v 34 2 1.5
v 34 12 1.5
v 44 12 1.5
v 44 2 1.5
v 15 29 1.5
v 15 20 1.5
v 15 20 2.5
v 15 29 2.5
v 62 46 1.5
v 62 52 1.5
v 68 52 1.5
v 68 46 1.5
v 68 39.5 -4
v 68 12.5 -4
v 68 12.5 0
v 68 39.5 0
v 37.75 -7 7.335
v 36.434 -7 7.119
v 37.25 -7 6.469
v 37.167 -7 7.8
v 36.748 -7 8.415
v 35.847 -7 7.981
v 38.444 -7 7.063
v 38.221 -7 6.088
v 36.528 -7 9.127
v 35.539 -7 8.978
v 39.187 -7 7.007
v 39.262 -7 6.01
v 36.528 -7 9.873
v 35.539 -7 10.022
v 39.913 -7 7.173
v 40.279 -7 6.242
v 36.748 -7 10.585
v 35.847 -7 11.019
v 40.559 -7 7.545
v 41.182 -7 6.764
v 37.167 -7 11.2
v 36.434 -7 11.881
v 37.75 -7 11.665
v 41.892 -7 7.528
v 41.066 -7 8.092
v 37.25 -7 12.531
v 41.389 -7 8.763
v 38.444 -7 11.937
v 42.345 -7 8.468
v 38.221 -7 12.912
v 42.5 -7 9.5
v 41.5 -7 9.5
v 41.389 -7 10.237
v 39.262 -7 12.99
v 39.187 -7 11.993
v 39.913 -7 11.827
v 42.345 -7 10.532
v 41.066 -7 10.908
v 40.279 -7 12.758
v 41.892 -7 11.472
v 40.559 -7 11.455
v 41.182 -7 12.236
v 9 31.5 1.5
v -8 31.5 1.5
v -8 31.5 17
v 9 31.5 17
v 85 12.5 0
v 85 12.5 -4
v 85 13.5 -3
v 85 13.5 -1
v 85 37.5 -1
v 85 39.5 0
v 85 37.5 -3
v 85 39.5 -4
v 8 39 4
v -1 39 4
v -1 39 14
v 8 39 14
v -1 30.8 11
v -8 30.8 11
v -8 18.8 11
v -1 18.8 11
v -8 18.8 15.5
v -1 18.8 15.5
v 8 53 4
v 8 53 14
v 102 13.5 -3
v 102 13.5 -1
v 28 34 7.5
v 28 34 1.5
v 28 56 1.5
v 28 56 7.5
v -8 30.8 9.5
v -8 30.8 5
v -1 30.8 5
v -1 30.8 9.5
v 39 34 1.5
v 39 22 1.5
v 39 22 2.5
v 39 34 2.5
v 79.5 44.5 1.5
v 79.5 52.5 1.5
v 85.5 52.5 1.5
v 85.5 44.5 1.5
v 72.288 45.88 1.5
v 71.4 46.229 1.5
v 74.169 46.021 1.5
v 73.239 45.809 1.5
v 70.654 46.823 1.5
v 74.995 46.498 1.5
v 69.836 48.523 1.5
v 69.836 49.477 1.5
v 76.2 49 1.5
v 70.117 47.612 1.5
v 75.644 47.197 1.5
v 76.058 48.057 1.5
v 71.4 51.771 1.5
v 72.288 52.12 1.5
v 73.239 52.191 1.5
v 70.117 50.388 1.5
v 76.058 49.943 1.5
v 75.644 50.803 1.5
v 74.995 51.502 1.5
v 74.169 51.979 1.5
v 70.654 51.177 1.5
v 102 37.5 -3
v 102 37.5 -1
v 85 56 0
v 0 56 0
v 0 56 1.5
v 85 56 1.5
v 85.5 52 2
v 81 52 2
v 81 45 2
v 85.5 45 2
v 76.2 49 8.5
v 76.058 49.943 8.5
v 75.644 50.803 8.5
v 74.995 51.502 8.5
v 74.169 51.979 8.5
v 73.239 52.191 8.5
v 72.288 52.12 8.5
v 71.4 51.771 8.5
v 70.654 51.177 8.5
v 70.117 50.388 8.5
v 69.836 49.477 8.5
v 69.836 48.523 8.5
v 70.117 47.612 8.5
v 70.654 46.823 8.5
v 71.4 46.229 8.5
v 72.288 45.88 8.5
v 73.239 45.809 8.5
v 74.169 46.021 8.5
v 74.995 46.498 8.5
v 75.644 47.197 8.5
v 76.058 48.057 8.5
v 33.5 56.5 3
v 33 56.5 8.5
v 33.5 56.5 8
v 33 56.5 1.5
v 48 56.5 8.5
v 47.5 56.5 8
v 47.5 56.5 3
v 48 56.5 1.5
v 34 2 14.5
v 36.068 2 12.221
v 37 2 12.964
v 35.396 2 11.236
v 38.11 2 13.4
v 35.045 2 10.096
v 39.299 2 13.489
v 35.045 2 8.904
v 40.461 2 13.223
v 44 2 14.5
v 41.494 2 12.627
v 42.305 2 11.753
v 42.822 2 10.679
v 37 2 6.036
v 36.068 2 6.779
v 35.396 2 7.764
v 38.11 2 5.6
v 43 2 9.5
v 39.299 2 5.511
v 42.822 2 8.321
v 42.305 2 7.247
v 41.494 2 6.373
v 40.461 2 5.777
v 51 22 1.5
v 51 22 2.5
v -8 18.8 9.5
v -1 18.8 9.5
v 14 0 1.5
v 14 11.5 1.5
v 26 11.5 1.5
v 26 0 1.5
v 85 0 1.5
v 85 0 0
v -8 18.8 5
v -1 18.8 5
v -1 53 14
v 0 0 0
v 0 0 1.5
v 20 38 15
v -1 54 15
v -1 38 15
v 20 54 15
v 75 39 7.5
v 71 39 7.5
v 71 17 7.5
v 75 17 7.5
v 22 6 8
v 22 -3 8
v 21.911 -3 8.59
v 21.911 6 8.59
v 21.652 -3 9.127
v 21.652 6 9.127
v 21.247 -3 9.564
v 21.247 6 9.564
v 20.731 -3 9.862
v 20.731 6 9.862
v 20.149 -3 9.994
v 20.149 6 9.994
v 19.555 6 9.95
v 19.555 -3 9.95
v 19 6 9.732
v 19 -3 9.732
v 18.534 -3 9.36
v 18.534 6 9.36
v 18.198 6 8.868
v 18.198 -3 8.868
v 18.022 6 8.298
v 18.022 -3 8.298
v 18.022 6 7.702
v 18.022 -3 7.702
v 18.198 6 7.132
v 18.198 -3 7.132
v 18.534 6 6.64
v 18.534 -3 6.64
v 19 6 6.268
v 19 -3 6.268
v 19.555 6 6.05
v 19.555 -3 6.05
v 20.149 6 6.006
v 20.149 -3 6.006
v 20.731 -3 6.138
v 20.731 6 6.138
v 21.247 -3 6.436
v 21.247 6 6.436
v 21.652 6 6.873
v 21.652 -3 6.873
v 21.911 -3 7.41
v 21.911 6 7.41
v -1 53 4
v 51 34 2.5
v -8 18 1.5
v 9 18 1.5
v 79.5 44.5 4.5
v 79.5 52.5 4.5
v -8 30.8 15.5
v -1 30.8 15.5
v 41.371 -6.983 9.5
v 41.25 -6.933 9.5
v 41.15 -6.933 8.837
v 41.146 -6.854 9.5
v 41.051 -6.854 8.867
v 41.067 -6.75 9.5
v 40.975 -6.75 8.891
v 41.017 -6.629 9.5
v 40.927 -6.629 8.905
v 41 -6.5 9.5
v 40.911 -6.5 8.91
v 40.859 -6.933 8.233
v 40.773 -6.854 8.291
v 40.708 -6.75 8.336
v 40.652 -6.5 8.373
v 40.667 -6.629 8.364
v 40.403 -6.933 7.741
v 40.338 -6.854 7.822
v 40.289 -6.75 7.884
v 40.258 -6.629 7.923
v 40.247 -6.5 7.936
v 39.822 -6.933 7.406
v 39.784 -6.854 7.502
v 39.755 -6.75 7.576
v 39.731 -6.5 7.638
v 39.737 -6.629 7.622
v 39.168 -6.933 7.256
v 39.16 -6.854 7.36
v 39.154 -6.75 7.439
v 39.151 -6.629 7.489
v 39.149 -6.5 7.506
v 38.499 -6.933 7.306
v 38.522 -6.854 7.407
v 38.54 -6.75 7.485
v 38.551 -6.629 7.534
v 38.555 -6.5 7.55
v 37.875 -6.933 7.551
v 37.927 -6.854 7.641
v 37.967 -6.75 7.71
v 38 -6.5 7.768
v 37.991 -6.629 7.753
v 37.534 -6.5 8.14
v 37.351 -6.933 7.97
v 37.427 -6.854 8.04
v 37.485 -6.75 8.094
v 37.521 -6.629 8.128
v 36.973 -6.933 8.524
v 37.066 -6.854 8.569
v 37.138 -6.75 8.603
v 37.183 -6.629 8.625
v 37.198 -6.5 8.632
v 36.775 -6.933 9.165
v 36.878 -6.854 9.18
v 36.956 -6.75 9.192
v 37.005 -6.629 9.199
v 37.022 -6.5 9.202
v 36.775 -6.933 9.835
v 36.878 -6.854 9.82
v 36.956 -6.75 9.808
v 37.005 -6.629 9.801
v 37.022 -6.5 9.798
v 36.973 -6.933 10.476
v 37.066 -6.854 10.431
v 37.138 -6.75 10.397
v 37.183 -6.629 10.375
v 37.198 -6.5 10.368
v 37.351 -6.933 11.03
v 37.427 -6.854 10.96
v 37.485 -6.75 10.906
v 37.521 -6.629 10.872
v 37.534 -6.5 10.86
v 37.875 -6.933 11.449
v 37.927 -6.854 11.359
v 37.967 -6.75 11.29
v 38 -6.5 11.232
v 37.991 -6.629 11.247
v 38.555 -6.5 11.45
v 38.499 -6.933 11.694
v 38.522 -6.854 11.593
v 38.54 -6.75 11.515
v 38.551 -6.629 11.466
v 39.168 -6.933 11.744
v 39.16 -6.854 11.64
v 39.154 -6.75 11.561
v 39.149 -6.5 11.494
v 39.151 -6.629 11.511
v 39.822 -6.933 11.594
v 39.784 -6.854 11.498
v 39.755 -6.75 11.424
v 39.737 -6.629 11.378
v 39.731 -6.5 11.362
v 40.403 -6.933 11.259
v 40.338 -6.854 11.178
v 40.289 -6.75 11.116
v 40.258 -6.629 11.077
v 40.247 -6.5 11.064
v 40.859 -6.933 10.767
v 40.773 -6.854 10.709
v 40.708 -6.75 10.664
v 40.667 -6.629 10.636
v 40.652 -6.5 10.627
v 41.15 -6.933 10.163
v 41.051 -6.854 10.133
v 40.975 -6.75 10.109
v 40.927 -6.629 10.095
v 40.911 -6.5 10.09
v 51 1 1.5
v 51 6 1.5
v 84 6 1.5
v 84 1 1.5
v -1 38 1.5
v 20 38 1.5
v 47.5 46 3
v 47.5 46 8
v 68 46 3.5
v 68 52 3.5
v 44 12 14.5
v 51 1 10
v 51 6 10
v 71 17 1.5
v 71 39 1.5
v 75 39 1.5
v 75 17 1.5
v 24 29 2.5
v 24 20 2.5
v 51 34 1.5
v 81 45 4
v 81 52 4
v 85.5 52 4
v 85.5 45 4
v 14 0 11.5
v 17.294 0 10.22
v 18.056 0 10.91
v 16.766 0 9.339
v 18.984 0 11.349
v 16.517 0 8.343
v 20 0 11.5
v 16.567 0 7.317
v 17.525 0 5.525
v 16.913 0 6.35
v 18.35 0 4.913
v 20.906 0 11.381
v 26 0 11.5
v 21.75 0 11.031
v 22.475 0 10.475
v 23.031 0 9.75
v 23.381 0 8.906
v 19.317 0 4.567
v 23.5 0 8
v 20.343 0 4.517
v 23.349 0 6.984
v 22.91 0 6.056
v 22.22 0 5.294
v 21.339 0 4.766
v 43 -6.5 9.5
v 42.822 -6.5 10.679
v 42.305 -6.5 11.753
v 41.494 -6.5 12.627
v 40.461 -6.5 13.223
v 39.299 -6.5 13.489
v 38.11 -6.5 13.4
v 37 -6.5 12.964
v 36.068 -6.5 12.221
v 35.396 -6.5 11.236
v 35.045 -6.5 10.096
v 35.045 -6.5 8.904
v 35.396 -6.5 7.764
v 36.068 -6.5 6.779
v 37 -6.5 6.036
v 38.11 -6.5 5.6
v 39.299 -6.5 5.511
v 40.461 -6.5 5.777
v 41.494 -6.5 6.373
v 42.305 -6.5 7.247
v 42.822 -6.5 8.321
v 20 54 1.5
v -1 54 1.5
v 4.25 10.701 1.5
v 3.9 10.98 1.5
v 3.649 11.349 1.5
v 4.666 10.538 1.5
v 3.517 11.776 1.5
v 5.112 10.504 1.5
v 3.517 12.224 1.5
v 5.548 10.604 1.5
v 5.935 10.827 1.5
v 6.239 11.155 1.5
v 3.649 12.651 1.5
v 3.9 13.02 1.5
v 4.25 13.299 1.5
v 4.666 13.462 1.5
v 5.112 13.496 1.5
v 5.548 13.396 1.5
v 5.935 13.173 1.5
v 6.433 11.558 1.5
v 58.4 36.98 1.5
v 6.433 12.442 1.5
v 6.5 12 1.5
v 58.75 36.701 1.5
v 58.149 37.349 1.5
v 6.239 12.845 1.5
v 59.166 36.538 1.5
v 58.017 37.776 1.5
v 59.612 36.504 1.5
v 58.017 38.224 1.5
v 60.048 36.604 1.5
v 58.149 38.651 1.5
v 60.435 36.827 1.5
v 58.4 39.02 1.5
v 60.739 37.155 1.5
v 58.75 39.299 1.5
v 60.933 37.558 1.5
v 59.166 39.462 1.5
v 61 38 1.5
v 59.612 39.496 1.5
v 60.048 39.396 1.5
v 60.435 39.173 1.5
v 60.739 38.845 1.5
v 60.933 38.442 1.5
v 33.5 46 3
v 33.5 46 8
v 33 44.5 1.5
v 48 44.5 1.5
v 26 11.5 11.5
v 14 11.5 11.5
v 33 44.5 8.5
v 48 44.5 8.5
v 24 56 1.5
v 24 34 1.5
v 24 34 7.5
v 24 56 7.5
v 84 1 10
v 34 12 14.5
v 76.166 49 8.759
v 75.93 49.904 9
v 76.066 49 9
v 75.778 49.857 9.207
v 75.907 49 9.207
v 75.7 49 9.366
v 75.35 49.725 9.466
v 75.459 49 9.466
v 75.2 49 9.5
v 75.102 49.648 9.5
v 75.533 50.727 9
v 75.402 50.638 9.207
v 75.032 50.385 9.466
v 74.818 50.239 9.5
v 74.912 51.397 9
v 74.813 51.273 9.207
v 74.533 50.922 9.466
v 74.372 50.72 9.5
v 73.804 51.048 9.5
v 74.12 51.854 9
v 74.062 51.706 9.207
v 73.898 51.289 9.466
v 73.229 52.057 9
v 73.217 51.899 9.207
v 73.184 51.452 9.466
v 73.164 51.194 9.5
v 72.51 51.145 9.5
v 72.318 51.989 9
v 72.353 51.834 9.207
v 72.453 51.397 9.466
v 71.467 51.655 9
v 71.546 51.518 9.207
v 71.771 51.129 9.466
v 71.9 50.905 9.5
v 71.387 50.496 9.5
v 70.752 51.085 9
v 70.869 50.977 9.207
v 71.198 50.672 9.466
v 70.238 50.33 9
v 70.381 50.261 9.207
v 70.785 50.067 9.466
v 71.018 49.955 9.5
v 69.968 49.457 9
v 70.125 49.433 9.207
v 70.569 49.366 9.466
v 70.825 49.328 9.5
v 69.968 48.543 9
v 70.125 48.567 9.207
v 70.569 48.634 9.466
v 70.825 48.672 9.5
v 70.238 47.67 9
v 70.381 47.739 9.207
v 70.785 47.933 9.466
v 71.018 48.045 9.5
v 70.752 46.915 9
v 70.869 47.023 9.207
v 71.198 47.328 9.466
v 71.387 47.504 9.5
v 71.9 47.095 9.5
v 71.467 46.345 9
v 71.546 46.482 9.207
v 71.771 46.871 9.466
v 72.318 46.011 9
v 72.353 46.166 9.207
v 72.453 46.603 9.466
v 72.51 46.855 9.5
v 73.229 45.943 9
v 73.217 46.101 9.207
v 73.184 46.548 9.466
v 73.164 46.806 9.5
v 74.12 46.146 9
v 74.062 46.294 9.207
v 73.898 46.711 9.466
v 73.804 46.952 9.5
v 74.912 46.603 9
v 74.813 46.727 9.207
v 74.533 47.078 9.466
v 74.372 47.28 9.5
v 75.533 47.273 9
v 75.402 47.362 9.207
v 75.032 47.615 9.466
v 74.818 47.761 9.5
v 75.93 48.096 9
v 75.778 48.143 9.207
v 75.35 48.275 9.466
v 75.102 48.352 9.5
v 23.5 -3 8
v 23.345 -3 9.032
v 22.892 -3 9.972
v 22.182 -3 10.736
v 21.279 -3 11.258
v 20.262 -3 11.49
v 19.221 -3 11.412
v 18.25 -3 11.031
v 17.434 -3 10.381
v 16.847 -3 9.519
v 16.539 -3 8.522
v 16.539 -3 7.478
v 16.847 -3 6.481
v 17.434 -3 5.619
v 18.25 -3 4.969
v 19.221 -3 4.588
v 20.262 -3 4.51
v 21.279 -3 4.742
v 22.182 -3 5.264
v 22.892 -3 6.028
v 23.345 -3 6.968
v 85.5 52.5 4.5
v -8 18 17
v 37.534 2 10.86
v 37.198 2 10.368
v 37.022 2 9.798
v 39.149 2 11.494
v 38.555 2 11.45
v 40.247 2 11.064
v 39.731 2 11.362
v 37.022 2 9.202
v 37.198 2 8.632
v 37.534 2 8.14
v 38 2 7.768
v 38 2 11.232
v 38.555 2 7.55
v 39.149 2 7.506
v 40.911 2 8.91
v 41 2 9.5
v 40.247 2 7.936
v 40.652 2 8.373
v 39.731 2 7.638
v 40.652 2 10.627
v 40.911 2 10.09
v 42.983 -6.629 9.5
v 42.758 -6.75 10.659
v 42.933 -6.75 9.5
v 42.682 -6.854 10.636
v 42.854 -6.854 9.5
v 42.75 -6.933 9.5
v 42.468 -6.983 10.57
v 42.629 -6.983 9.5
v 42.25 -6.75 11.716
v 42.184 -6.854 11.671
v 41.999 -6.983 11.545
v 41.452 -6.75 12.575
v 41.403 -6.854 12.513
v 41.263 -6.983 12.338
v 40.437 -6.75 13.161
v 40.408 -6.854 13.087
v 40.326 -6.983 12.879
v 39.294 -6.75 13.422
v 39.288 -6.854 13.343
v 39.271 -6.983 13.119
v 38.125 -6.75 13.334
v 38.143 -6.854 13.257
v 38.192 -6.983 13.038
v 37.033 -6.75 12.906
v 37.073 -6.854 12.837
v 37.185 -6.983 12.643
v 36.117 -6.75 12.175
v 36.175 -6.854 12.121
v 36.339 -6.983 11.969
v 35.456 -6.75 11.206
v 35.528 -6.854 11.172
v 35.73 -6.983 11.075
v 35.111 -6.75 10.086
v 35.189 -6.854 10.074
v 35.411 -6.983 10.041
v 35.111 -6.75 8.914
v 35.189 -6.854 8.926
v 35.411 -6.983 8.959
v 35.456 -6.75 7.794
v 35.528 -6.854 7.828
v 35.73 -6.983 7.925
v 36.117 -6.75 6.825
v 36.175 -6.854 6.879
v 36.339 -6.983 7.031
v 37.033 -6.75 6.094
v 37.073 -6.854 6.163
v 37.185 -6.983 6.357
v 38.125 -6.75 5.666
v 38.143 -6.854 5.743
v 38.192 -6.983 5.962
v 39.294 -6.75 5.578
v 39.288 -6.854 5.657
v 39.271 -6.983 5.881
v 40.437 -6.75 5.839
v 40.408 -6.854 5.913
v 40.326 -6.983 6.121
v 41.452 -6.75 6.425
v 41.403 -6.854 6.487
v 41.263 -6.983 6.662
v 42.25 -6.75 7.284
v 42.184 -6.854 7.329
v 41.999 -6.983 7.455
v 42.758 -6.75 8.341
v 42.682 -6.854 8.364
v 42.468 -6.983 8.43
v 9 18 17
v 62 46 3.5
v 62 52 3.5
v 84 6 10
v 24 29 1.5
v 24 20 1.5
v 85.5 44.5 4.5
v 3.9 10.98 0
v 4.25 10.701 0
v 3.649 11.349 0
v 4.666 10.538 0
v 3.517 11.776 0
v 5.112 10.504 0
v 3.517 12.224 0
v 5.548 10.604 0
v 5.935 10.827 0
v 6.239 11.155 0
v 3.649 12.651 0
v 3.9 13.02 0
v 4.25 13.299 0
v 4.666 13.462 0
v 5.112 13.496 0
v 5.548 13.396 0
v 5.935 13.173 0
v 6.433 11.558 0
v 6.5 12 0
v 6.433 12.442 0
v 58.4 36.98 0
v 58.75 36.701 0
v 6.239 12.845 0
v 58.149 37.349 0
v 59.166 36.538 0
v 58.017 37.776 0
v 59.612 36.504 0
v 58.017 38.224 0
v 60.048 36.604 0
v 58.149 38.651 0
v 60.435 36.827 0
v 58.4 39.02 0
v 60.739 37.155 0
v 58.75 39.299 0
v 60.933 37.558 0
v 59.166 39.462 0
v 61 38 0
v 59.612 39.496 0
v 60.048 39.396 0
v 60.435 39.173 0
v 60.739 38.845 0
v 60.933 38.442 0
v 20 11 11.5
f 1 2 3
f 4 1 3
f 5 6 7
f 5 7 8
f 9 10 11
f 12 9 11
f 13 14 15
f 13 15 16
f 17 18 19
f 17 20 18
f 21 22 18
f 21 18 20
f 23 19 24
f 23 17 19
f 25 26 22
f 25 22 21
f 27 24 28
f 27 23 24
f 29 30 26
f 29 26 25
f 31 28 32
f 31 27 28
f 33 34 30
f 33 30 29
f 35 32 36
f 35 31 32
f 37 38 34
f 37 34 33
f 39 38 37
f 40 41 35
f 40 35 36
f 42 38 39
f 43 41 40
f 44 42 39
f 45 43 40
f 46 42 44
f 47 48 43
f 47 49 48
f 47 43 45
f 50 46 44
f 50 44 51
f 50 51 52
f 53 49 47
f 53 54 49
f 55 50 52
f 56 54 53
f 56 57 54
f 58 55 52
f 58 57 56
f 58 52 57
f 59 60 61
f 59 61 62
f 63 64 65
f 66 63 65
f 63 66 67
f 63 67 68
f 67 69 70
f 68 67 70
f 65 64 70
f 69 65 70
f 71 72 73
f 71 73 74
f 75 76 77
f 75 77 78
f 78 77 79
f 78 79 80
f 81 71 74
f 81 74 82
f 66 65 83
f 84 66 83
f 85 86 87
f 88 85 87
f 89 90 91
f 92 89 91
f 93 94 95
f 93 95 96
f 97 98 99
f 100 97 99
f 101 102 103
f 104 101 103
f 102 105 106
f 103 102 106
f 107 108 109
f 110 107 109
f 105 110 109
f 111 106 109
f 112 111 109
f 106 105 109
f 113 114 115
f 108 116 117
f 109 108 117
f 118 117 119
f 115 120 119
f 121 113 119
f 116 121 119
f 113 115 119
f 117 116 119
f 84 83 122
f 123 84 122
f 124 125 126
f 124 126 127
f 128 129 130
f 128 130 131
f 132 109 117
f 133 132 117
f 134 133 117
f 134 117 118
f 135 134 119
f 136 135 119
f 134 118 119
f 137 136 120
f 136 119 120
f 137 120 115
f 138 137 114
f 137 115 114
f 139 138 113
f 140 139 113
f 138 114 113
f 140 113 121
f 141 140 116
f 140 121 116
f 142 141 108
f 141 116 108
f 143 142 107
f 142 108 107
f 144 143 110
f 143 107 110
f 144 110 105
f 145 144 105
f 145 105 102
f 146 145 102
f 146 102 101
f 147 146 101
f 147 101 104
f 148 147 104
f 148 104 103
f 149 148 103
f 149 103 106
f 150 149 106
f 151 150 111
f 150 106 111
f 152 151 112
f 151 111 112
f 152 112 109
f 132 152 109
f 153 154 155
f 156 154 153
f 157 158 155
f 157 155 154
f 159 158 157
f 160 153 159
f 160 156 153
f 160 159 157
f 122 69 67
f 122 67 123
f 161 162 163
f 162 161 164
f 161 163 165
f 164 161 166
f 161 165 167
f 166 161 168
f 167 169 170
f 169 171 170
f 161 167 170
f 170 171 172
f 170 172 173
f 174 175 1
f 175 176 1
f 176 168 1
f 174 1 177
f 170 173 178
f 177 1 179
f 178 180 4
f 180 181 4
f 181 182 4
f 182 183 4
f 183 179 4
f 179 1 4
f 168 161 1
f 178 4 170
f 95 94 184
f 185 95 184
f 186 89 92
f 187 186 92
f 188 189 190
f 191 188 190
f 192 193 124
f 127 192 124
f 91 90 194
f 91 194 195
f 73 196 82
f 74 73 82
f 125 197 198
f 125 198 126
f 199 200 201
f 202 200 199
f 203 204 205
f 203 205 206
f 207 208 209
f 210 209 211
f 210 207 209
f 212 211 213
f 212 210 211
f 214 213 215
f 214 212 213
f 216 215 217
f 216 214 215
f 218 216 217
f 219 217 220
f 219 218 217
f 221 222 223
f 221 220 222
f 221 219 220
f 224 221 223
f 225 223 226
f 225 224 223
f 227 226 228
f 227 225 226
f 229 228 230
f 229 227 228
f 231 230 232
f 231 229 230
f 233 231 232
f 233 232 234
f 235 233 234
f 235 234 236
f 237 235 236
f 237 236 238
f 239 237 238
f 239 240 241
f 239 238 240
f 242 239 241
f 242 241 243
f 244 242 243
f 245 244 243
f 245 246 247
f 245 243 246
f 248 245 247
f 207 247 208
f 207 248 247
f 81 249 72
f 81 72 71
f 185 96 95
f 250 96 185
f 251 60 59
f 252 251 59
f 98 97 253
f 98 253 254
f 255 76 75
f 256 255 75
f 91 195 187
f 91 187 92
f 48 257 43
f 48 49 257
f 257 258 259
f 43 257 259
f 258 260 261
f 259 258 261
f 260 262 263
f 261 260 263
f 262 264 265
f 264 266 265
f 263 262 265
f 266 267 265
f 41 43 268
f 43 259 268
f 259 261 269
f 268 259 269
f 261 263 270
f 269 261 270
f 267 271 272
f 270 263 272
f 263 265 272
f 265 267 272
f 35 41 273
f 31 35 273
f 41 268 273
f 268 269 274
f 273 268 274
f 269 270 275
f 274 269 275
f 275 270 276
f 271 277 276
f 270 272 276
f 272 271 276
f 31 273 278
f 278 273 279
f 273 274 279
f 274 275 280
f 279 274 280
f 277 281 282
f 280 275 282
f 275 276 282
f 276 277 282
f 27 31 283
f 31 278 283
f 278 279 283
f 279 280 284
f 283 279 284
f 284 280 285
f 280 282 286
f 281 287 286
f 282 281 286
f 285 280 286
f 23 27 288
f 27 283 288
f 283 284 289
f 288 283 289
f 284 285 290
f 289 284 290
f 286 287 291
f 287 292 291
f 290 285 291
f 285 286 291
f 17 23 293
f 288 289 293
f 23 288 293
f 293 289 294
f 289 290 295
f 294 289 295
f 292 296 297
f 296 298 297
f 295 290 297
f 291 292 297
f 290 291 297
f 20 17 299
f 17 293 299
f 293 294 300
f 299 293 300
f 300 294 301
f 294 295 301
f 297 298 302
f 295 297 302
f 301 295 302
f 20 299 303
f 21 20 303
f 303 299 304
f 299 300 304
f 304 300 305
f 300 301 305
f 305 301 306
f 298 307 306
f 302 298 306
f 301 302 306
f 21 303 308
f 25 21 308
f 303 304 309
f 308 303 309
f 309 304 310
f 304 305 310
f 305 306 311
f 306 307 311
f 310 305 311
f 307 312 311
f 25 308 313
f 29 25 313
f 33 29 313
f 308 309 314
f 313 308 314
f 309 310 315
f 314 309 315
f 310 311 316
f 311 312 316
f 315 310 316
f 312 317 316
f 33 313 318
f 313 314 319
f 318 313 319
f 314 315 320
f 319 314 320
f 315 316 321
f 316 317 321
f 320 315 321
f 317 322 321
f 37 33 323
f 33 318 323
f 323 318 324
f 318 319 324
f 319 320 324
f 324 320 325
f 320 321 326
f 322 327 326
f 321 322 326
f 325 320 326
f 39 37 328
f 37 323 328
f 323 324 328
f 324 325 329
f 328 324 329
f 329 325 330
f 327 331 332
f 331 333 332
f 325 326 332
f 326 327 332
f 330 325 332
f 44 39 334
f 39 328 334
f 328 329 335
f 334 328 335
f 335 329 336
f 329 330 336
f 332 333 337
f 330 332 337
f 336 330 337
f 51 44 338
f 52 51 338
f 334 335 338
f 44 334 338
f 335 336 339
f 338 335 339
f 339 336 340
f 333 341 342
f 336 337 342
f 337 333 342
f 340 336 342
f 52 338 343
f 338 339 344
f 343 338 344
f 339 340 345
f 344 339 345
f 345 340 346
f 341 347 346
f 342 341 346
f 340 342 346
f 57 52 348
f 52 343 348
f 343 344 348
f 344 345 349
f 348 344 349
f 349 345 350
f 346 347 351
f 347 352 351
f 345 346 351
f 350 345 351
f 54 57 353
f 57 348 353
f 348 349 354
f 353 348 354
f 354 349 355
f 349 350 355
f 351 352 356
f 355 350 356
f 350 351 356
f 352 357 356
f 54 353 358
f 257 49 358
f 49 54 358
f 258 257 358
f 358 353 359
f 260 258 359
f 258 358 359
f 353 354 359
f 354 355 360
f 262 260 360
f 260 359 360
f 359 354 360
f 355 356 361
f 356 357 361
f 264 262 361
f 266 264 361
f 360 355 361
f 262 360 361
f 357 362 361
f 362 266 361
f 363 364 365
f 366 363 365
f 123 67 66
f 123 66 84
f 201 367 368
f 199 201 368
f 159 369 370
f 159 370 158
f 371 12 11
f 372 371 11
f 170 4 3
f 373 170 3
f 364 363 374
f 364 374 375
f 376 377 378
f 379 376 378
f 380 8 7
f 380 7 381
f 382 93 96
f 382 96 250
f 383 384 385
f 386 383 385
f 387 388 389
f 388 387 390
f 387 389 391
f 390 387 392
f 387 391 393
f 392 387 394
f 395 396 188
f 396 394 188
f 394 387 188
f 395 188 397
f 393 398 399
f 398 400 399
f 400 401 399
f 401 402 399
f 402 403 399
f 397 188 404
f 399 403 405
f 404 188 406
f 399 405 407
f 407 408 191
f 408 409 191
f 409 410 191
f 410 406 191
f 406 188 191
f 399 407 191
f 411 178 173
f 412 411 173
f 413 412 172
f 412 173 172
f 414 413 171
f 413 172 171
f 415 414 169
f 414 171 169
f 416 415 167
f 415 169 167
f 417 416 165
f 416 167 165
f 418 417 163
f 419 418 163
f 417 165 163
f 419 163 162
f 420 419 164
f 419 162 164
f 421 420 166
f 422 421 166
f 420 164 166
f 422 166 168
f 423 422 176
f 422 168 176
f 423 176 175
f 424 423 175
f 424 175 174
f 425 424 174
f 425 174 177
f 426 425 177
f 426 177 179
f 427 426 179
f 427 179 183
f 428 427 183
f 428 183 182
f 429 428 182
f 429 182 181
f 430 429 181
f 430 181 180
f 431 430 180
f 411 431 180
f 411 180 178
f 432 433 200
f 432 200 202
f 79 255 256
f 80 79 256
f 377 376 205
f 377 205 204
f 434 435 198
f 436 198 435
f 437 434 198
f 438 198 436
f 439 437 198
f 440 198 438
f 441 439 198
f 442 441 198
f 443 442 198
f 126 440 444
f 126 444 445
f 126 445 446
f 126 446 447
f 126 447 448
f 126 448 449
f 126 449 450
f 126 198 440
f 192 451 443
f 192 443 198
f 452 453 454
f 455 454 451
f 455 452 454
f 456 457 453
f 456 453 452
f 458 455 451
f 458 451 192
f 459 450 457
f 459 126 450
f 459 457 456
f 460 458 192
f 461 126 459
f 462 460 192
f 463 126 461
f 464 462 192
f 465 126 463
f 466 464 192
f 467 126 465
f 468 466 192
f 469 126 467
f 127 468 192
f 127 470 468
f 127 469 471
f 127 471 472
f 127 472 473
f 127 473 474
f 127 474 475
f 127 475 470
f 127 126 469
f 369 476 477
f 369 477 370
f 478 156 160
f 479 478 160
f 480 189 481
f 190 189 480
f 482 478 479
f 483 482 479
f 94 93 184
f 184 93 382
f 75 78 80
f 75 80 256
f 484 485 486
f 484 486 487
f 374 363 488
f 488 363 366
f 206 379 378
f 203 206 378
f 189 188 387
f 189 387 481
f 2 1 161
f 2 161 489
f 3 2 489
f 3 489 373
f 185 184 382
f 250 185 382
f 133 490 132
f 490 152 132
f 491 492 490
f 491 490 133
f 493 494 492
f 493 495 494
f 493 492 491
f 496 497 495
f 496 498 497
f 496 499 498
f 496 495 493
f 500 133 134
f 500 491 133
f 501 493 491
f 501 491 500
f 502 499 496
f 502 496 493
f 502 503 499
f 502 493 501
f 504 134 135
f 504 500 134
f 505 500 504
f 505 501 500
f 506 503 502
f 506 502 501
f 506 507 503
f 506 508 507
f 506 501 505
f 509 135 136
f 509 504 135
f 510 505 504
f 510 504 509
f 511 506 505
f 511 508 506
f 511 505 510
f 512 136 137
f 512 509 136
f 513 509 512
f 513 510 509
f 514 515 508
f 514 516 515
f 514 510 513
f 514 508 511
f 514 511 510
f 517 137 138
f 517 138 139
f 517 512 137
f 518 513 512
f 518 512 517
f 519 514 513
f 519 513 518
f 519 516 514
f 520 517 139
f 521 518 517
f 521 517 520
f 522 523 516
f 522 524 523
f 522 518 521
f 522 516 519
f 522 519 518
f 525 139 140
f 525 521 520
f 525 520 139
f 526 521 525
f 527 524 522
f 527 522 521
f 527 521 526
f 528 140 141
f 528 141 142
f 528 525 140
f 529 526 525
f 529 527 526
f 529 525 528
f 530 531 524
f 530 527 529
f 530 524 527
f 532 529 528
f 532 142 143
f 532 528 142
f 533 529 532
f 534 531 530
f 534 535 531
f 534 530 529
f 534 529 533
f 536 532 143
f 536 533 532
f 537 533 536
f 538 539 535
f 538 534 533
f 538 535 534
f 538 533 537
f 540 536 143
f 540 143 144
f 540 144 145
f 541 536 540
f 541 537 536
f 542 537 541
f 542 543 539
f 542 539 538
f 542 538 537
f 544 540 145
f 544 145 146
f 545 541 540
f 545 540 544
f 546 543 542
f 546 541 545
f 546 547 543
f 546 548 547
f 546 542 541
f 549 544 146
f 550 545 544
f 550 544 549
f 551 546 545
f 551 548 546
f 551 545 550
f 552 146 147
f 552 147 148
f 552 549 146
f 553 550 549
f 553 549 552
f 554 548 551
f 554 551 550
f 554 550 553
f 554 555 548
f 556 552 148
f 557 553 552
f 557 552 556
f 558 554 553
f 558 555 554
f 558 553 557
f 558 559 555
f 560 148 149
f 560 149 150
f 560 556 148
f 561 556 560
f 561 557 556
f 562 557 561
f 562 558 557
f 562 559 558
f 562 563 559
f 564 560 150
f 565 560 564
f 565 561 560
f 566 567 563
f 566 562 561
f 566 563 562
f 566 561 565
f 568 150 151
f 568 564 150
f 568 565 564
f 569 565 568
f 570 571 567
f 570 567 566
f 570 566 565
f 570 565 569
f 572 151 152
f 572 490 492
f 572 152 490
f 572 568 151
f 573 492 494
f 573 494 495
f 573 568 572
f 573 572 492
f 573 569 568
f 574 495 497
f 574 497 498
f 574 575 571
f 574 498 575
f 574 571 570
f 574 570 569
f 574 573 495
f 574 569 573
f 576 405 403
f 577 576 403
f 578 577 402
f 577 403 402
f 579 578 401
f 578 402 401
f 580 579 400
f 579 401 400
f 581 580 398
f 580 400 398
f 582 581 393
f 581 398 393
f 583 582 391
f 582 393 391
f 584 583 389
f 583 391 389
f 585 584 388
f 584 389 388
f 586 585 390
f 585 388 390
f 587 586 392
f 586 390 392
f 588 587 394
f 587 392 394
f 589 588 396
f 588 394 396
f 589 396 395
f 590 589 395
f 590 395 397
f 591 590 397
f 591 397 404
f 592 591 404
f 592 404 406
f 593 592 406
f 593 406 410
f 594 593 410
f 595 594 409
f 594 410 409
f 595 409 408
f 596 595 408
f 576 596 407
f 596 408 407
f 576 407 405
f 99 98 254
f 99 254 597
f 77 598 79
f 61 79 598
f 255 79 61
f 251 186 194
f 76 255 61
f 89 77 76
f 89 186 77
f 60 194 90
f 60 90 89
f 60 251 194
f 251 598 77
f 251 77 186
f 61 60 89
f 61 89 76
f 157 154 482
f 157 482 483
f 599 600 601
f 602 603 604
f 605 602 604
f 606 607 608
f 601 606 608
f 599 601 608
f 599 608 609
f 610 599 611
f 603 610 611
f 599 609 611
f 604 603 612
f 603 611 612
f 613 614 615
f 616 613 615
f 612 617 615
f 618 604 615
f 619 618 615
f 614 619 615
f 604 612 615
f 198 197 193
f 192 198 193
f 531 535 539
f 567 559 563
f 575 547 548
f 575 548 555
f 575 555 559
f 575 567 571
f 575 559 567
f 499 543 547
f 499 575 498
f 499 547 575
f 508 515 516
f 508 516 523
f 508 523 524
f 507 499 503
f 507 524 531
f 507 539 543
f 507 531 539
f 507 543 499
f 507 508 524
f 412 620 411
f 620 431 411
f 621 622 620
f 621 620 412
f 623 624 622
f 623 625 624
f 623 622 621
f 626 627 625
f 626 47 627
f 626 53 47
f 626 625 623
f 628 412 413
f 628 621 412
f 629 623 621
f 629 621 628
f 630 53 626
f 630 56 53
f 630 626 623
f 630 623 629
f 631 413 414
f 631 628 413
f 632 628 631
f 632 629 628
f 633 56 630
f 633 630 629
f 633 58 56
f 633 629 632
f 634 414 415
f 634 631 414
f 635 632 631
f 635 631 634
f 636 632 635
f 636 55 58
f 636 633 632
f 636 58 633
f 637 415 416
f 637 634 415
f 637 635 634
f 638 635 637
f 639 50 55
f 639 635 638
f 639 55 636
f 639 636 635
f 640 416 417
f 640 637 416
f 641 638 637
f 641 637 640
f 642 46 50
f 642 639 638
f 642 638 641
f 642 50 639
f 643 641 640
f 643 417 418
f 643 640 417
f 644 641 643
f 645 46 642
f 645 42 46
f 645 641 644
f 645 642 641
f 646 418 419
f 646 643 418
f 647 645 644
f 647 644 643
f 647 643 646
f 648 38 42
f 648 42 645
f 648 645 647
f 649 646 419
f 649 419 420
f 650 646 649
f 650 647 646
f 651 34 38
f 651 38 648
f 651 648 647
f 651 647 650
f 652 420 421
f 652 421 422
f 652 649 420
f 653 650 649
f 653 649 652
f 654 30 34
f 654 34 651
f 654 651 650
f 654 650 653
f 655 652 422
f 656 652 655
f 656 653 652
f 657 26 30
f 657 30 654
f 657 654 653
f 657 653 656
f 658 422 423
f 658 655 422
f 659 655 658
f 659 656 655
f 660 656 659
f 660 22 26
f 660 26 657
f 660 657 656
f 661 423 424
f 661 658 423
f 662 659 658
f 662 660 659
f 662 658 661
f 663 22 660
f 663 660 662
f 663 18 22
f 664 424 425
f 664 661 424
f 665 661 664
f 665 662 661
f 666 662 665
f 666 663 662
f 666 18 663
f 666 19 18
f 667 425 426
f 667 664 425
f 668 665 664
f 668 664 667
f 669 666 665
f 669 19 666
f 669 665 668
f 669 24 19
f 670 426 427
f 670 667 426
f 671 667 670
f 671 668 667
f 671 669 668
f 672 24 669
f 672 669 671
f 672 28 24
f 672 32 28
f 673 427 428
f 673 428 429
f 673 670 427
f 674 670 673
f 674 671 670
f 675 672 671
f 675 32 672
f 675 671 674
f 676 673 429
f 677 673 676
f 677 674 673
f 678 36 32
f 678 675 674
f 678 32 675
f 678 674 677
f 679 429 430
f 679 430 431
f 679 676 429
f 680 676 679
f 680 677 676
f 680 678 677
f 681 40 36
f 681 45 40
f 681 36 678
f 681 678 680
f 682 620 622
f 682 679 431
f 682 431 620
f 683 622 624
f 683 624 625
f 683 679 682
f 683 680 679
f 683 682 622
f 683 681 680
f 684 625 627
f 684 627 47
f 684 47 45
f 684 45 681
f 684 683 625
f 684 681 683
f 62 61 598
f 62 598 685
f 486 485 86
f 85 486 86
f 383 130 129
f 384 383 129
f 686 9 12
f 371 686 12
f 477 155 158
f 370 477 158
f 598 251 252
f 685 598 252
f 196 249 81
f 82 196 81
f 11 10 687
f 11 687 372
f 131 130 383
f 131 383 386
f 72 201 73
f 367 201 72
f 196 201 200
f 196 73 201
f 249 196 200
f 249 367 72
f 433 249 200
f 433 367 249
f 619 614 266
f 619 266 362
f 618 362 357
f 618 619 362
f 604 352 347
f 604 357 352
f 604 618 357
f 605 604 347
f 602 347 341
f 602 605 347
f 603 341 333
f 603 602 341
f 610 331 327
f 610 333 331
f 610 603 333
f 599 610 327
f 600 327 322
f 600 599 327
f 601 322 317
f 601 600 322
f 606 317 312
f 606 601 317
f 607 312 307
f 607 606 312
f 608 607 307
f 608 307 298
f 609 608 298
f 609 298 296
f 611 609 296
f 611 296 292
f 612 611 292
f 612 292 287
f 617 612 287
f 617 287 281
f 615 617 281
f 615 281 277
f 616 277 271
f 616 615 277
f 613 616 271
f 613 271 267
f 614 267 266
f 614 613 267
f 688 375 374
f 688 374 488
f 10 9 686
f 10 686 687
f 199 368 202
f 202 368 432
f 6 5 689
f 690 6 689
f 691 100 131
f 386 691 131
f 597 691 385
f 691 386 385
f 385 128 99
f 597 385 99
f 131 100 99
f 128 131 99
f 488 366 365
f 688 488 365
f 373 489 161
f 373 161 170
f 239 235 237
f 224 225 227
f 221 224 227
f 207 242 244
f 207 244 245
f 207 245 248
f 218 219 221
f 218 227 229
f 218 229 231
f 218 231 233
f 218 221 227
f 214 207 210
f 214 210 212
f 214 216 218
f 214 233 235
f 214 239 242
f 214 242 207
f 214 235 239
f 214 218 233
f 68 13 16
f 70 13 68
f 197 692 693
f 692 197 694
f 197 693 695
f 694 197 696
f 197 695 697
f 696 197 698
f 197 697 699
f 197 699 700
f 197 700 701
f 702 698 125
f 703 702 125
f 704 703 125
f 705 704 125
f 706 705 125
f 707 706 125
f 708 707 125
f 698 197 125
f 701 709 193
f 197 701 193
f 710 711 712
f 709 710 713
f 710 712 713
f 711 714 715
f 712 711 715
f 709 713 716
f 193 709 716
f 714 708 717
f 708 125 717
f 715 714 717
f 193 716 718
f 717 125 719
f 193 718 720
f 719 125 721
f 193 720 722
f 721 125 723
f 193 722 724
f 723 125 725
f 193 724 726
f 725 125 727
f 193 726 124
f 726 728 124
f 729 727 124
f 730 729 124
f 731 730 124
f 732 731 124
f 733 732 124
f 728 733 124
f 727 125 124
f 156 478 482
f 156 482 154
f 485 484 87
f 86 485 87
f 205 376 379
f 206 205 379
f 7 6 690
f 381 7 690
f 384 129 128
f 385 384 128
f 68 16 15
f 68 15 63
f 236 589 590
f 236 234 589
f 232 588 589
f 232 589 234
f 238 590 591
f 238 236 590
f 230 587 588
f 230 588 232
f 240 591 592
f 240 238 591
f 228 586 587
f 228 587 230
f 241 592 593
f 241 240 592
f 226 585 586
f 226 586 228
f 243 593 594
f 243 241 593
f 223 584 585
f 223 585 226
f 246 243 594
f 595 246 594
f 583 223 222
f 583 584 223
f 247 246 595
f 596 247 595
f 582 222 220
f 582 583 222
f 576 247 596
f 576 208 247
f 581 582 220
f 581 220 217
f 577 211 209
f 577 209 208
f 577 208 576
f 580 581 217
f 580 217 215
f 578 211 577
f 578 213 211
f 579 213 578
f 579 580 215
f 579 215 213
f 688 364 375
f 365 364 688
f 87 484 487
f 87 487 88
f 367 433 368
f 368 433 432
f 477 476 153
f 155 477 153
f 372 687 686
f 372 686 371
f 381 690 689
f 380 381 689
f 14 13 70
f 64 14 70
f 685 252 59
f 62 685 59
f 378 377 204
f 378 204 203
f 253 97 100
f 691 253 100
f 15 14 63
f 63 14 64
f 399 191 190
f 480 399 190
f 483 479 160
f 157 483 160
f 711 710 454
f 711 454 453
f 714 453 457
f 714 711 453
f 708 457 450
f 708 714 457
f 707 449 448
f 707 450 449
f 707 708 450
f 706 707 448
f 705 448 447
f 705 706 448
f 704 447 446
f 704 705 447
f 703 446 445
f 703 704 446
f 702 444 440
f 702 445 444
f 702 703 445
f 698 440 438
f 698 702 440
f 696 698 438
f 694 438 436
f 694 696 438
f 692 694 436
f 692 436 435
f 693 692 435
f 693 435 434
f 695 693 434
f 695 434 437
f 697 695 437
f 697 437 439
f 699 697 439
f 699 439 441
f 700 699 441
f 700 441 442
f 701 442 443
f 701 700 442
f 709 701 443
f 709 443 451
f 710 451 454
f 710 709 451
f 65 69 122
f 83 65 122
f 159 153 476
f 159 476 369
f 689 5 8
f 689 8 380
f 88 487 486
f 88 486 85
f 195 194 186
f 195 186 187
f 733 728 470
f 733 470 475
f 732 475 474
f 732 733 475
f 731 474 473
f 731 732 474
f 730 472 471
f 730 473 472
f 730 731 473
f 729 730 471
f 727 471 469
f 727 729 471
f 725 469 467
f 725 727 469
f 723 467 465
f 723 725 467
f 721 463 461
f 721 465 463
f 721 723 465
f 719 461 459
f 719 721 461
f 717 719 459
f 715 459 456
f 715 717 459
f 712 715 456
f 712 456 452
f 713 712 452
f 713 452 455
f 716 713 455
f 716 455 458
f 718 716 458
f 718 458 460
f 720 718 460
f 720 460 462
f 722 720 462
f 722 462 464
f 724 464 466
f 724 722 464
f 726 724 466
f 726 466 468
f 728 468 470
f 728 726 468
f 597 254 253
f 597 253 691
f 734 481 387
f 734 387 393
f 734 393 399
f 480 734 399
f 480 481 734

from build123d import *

# Parameters (mm, degrees)
BOX001_W               = 33
BOX001_H               = 5
BOX001_DEPTH           = 8.5
CYLINDER001_R          = 2
CYLINDER001_DEPTH      = 10
CYLINDER001_ROLL_ANGLE = 90
BOX003_W               = 12
BOX003_H               = 11.5
BOX003_DEPTH           = 10
CYLINDER_R             = 3.5
CYLINDER_DEPTH         = 14
CYLINDER_ROLL_ANGLE    = 90
CYLINDER002_R          = 2
CYLINDER002_DEPTH      = 12
CYLINDER003_R          = 4
CYLINDER003_DEPTH      = 10
FILLET_R               = 0.5
FILLET_ROLL_ANGLE      = 90
BOX002_W               = 10
BOX002_H               = 10
BOX002_DEPTH           = 13
BOX006_W               = 8
BOX006_H               = 12
BOX006_DEPTH           = 4.5
BOX005_W               = 8
BOX005_H               = 12
BOX005_DEPTH           = 4.5
BOX004_W               = 17
BOX004_H               = 13.5
BOX004_DEPTH           = 15.5
BOX008_W               = 10
BOX008_H               = 14
BOX008_DEPTH           = 10
BOX007_W               = 21
BOX007_H               = 16
BOX007_DEPTH           = 13.5
BOX009_W               = 9
BOX009_H               = 9
BOX009_DEPTH           = 1
BOX010_W               = 12
BOX010_H               = 12
BOX010_DEPTH           = 1
BOX011_W               = 4
BOX011_H               = 22
BOX011_DEPTH           = 6
BOX012_W               = 4
BOX012_H               = 22
BOX012_DEPTH           = 6
CYLINDER004_R          = 3.2
CYLINDER004_DEPTH      = 8
FILLET001_R            = 1
BOX013_W               = 6
BOX013_H               = 6
BOX013_DEPTH           = 2
BOX015_W               = 5
BOX015_H               = 7
BOX015_DEPTH           = 2
BOX014_W               = 6
BOX014_H               = 8
BOX014_DEPTH           = 3
BOX017_W               = 14
BOX017_H               = 11
BOX017_DEPTH           = 5
BOX016_W               = 15
BOX016_H               = 12
BOX016_DEPTH           = 7
BOX018_W               = 17
BOX018_H               = 27
BOX018_DEPTH           = 4
BOX019_W               = 32
BOX019_H               = 24
BOX019_DEPTH           = 2
CYLINDER005_R          = 1.5
CYLINDER005_DEPTH      = 3
CYLINDER006_R          = 1.5
CYLINDER006_DEPTH      = 3
BOX_W                  = 85
BOX_H                  = 56
BOX_DEPTH              = 1.5


with BuildPart() as pines:
    # Box001 → Box001 (new body)
    with BuildSketch(Plane(origin=(51, 1, 1.5), x_dir=(1, 0, 0), z_dir=(0, 0, 1))):
        with Locations((16.5, 2.5)):
            Rectangle(BOX001_W, BOX001_H)
    extrude(amount=BOX001_DEPTH)


with BuildPart() as cylinder001:
    # Cylinder001 → Cylinder001 (new body)
    with BuildSketch(Plane.XY):
        Circle(CYLINDER001_R)
    extrude(amount=CYLINDER001_DEPTH)


with BuildPart() as cylinder001_1:
    # Cylinder001 roll: moved
    add(cylinder001.part.rotate(Axis((0, 0, 0), (1, 0, 0)), CYLINDER001_ROLL_ANGLE))


with BuildPart() as cylinder001_2:
    # Cylinder001 placement: moved
    add(cylinder001_1.part.moved(Location((20, 6, 8))))


with BuildPart() as audiocaja:
    # Box003 → Box003 (new body)
    with BuildSketch(Plane(origin=(14, 0, 1.5), x_dir=(1, 0, 0), z_dir=(0, 0, 1))):
        with Locations((6, 5.75)):
            Rectangle(BOX003_W, BOX003_H)
    extrude(amount=BOX003_DEPTH)


with BuildPart() as audio:
    # Cylinder → Cylinder (new body)
    with BuildSketch(Plane.XY):
        Circle(CYLINDER_R)
    extrude(amount=CYLINDER_DEPTH)


with BuildPart() as audio_1:
    # Cylinder roll: moved
    add(audio.part.rotate(Axis((0, 0, 0), (1, 0, 0)), CYLINDER_ROLL_ANGLE))


with BuildPart() as audio_2:
    # Cylinder placement: moved
    add(audio_1.part.moved(Location((20, 11, 8))))

    # Fusion: union audiocaja
    add(audiocaja.part)

    # Cut: cut Cylinder001
    add(cylinder001_2.part, mode=Mode.SUBTRACT)


with BuildPart() as cylinder002:
    # Cylinder002 → Cylinder002 (new body)
    with BuildSketch(Plane.XY.offset(-1)):
        Circle(CYLINDER002_R)
    extrude(amount=CYLINDER002_DEPTH)


with BuildPart() as video2:
    # Cylinder003 → Cylinder003 (new body)
    with BuildSketch(Plane.XY):
        Circle(CYLINDER003_R)
    extrude(amount=CYLINDER003_DEPTH)

    # Cut001: cut Cylinder002
    add(cylinder002.part, mode=Mode.SUBTRACT)

    # Fillet
    fillet_edges = [video2.edges().sort_by_distance(p)[0] for p in [
        (-4, 0, 10),
        (-1.414214, 1.414214, 10),
        (1.414214, -1.414214, 10),
    ]]
    fillet(fillet_edges, radius=FILLET_R)


with BuildPart() as video2_1:
    # Fillet roll: moved
    add(video2.part.rotate(Axis((0, 0, 0), (1, 0, 0)), FILLET_ROLL_ANGLE))


with BuildPart() as video2_2:
    # Fillet placement: moved
    add(video2_1.part.moved(Location((39, 3, 9.5))))


with BuildPart() as video:
    # Box002 → Box002 (new body)
    with BuildSketch(Plane(origin=(34, 2, 1.5), x_dir=(1, 0, 0), z_dir=(0, 0, 1))):
        with Locations((5, 5)):
            Rectangle(BOX002_W, BOX002_H)
    extrude(amount=BOX002_DEPTH)

    # Fusion001: union video2
    add(video2_2.part)


with BuildPart() as box006:
    # Box006 → Box006 (new body)
    with BuildSketch(Plane(origin=(-9, 18.8, 11), x_dir=(1, 0, 0), z_dir=(0, 0, 1))):
        with Locations((4, 6)):
            Rectangle(BOX006_W, BOX006_H)
    extrude(amount=BOX006_DEPTH)


with BuildPart() as box005:
    # Box005 → Box005 (new body)
    with BuildSketch(Plane(origin=(-9, 18.8, 5), x_dir=(1, 0, 0), z_dir=(0, 0, 1))):
        with Locations((4, 6)):
            Rectangle(BOX005_W, BOX005_H)
    extrude(amount=BOX005_DEPTH)


with BuildPart() as usb:
    # Box004 → Box004 (new body)
    with BuildSketch(Plane(origin=(-8, 18, 1.5), x_dir=(1, 0, 0), z_dir=(0, 0, 1))):
        with Locations((8.5, 6.75)):
            Rectangle(BOX004_W, BOX004_H)
    extrude(amount=BOX004_DEPTH)

    # Cut002: cut Box005
    add(box005.part, mode=Mode.SUBTRACT)

    # Cut003: cut Box006
    add(box006.part, mode=Mode.SUBTRACT)


with BuildPart() as box008:
    # Box008 → Box008 (new body)
    with BuildSketch(Plane(origin=(-2, 39, 4), x_dir=(1, 0, 0), z_dir=(0, 0, 1))):
        with Locations((5, 7)):
            Rectangle(BOX008_W, BOX008_H)
    extrude(amount=BOX008_DEPTH)


with BuildPart() as rj47:
    # Box007 → Box007 (new body)
    with BuildSketch(Plane(origin=(-1, 38, 1.5), x_dir=(1, 0, 0), z_dir=(0, 0, 1))):
        with Locations((10.5, 8)):
            Rectangle(BOX007_W, BOX007_H)
    extrude(amount=BOX007_DEPTH)

    # Cut004: cut Box008
    add(box008.part, mode=Mode.SUBTRACT)


with BuildPart() as chip001:
    # Box009 → Box009 (new body)
    with BuildSketch(Plane(origin=(15, 20, 1.5), x_dir=(1, 0, 0), z_dir=(0, 0, 1))):
        with Locations((4.5, 4.5)):
            Rectangle(BOX009_W, BOX009_H)
    extrude(amount=BOX009_DEPTH)


with BuildPart() as chip002:
    # Box010 → Box010 (new body)
    with BuildSketch(Plane(origin=(39, 22, 1.5), x_dir=(1, 0, 0), z_dir=(0, 0, 1))):
        with Locations((6, 6)):
            Rectangle(BOX010_W, BOX010_H)
    extrude(amount=BOX010_DEPTH)


with BuildPart() as conector01:
    # Box011 → Box011 (new body)
    with BuildSketch(Plane(origin=(24, 34, 1.5), x_dir=(1, 0, 0), z_dir=(0, 0, 1))):
        with Locations((2, 11)):
            Rectangle(BOX011_W, BOX011_H)
    extrude(amount=BOX011_DEPTH)


with BuildPart() as conector02:
    # Box012 → Box012 (new body)
    with BuildSketch(Plane(origin=(71, 17, 1.5), x_dir=(1, 0, 0), z_dir=(0, 0, 1))):
        with Locations((2, 11)):
            Rectangle(BOX012_W, BOX012_H)
    extrude(amount=BOX012_DEPTH)


with BuildPart() as condensador:
    # Cylinder004 → Cylinder004 (new body)
    with BuildSketch(Plane(origin=(73, 49, 1.5), x_dir=(1, 0, 0), z_dir=(0, 0, 1))):
        Circle(CYLINDER004_R)
    extrude(amount=CYLINDER004_DEPTH)

    # Fillet001
    fillet001_edges = [condensador.edges().sort_by_distance(p)[0] for p in [
        (69.8, 49, 9.5),
    ]]
    fillet(fillet001_edges, radius=FILLET001_R)


with BuildPart() as chip03:
    # Box013 → Box013 (new body)
    with BuildSketch(Plane(origin=(62, 46, 1.5), x_dir=(1, 0, 0), z_dir=(0, 0, 1))):
        with Locations((3, 3)):
            Rectangle(BOX013_W, BOX013_H)
    extrude(amount=BOX013_DEPTH)


with BuildPart() as box015:
    # Box015 → Box015 (new body)
    with BuildSketch(Plane(origin=(1.5, 0.5, 2), x_dir=(1, 0, 0), z_dir=(0, 0, 1))):
        with Locations((2.5, 3.5)):
            Rectangle(BOX015_W, BOX015_H)
    extrude(amount=BOX015_DEPTH)


with BuildPart() as alimentacion:
    # Box014 → Box014 (new body)
    with BuildSketch(Plane.XY.offset(1.5)):
        with Locations((3, 4)):
            Rectangle(BOX014_W, BOX014_H)
    extrude(amount=BOX014_DEPTH)

    # Cut005: cut Box015
    add(box015.part, mode=Mode.SUBTRACT)


with BuildPart() as alimentacion_1:
    # Cut005 placement: moved
    add(alimentacion.part.moved(Location((79.5, 44.5, 0))))


with BuildPart() as box017:
    # Box017 → Box017 (new body)
    with BuildSketch(Plane(origin=(33.5, 46, 3), x_dir=(1, 0, 0), z_dir=(0, 0, 1))):
        with Locations((7, 5.5)):
            Rectangle(BOX017_W, BOX017_H)
    extrude(amount=BOX017_DEPTH)


with BuildPart() as hdmi:
    # Box016 → Box016 (new body)
    with BuildSketch(Plane(origin=(33, 44.5, 1.5), x_dir=(1, 0, 0), z_dir=(0, 0, 1))):
        with Locations((7.5, 6)):
            Rectangle(BOX016_W, BOX016_H)
    extrude(amount=BOX016_DEPTH)

    # Cut006: cut Box017
    add(box017.part, mode=Mode.SUBTRACT)


with BuildPart() as box018:
    # Box018 → Box018 (new body)
    with BuildSketch(Plane(origin=(68, 12.5, -4), x_dir=(1, 0, 0), z_dir=(0, 0, 1))):
        with Locations((8.5, 13.5)):
            Rectangle(BOX018_W, BOX018_H)
    extrude(amount=BOX018_DEPTH)


with BuildPart() as sd:
    # Box019 → Box019 (new body)
    with BuildSketch(Plane(origin=(70, 13.5, -3), x_dir=(1, 0, 0), z_dir=(0, 0, 1))):
        with Locations((16, 12)):
            Rectangle(BOX019_W, BOX019_H)
    extrude(amount=BOX019_DEPTH)

    # Fusion002: union Box018
    add(box018.part)


with BuildPart() as taladro1:
    # Cylinder005 → Cylinder005 (new body)
    with BuildSketch(Plane(origin=(5, 12, -1), x_dir=(1, 0, 0), z_dir=(0, 0, 1))):
        Circle(CYLINDER005_R)
    extrude(amount=CYLINDER005_DEPTH)


with BuildPart() as taladro2:
    # Cylinder006 → Cylinder006 (new body)
    with BuildSketch(Plane(origin=(59.5, 38, -1), x_dir=(1, 0, 0), z_dir=(0, 0, 1))):
        Circle(CYLINDER006_R)
    extrude(amount=CYLINDER006_DEPTH)


with BuildPart() as placabase:
    # Box → Box (new body)
    with BuildSketch(Plane.XY):
        with Locations((42.5, 28)):
            Rectangle(BOX_W, BOX_H)
    extrude(amount=BOX_DEPTH)

    # Cut007: cut taladro2
    add(taladro2.part, mode=Mode.SUBTRACT)

    # Cut008: cut taladro1
    add(taladro1.part, mode=Mode.SUBTRACT)


solid = Compound([pines.part, audio_2.part, video.part, usb.part, rj47.part, chip001.part, chip002.part, conector01.part, conector02.part, condensador.part, chip03.part, alimentacion_1.part, hdmi.part, sd.part, placabase.part])
